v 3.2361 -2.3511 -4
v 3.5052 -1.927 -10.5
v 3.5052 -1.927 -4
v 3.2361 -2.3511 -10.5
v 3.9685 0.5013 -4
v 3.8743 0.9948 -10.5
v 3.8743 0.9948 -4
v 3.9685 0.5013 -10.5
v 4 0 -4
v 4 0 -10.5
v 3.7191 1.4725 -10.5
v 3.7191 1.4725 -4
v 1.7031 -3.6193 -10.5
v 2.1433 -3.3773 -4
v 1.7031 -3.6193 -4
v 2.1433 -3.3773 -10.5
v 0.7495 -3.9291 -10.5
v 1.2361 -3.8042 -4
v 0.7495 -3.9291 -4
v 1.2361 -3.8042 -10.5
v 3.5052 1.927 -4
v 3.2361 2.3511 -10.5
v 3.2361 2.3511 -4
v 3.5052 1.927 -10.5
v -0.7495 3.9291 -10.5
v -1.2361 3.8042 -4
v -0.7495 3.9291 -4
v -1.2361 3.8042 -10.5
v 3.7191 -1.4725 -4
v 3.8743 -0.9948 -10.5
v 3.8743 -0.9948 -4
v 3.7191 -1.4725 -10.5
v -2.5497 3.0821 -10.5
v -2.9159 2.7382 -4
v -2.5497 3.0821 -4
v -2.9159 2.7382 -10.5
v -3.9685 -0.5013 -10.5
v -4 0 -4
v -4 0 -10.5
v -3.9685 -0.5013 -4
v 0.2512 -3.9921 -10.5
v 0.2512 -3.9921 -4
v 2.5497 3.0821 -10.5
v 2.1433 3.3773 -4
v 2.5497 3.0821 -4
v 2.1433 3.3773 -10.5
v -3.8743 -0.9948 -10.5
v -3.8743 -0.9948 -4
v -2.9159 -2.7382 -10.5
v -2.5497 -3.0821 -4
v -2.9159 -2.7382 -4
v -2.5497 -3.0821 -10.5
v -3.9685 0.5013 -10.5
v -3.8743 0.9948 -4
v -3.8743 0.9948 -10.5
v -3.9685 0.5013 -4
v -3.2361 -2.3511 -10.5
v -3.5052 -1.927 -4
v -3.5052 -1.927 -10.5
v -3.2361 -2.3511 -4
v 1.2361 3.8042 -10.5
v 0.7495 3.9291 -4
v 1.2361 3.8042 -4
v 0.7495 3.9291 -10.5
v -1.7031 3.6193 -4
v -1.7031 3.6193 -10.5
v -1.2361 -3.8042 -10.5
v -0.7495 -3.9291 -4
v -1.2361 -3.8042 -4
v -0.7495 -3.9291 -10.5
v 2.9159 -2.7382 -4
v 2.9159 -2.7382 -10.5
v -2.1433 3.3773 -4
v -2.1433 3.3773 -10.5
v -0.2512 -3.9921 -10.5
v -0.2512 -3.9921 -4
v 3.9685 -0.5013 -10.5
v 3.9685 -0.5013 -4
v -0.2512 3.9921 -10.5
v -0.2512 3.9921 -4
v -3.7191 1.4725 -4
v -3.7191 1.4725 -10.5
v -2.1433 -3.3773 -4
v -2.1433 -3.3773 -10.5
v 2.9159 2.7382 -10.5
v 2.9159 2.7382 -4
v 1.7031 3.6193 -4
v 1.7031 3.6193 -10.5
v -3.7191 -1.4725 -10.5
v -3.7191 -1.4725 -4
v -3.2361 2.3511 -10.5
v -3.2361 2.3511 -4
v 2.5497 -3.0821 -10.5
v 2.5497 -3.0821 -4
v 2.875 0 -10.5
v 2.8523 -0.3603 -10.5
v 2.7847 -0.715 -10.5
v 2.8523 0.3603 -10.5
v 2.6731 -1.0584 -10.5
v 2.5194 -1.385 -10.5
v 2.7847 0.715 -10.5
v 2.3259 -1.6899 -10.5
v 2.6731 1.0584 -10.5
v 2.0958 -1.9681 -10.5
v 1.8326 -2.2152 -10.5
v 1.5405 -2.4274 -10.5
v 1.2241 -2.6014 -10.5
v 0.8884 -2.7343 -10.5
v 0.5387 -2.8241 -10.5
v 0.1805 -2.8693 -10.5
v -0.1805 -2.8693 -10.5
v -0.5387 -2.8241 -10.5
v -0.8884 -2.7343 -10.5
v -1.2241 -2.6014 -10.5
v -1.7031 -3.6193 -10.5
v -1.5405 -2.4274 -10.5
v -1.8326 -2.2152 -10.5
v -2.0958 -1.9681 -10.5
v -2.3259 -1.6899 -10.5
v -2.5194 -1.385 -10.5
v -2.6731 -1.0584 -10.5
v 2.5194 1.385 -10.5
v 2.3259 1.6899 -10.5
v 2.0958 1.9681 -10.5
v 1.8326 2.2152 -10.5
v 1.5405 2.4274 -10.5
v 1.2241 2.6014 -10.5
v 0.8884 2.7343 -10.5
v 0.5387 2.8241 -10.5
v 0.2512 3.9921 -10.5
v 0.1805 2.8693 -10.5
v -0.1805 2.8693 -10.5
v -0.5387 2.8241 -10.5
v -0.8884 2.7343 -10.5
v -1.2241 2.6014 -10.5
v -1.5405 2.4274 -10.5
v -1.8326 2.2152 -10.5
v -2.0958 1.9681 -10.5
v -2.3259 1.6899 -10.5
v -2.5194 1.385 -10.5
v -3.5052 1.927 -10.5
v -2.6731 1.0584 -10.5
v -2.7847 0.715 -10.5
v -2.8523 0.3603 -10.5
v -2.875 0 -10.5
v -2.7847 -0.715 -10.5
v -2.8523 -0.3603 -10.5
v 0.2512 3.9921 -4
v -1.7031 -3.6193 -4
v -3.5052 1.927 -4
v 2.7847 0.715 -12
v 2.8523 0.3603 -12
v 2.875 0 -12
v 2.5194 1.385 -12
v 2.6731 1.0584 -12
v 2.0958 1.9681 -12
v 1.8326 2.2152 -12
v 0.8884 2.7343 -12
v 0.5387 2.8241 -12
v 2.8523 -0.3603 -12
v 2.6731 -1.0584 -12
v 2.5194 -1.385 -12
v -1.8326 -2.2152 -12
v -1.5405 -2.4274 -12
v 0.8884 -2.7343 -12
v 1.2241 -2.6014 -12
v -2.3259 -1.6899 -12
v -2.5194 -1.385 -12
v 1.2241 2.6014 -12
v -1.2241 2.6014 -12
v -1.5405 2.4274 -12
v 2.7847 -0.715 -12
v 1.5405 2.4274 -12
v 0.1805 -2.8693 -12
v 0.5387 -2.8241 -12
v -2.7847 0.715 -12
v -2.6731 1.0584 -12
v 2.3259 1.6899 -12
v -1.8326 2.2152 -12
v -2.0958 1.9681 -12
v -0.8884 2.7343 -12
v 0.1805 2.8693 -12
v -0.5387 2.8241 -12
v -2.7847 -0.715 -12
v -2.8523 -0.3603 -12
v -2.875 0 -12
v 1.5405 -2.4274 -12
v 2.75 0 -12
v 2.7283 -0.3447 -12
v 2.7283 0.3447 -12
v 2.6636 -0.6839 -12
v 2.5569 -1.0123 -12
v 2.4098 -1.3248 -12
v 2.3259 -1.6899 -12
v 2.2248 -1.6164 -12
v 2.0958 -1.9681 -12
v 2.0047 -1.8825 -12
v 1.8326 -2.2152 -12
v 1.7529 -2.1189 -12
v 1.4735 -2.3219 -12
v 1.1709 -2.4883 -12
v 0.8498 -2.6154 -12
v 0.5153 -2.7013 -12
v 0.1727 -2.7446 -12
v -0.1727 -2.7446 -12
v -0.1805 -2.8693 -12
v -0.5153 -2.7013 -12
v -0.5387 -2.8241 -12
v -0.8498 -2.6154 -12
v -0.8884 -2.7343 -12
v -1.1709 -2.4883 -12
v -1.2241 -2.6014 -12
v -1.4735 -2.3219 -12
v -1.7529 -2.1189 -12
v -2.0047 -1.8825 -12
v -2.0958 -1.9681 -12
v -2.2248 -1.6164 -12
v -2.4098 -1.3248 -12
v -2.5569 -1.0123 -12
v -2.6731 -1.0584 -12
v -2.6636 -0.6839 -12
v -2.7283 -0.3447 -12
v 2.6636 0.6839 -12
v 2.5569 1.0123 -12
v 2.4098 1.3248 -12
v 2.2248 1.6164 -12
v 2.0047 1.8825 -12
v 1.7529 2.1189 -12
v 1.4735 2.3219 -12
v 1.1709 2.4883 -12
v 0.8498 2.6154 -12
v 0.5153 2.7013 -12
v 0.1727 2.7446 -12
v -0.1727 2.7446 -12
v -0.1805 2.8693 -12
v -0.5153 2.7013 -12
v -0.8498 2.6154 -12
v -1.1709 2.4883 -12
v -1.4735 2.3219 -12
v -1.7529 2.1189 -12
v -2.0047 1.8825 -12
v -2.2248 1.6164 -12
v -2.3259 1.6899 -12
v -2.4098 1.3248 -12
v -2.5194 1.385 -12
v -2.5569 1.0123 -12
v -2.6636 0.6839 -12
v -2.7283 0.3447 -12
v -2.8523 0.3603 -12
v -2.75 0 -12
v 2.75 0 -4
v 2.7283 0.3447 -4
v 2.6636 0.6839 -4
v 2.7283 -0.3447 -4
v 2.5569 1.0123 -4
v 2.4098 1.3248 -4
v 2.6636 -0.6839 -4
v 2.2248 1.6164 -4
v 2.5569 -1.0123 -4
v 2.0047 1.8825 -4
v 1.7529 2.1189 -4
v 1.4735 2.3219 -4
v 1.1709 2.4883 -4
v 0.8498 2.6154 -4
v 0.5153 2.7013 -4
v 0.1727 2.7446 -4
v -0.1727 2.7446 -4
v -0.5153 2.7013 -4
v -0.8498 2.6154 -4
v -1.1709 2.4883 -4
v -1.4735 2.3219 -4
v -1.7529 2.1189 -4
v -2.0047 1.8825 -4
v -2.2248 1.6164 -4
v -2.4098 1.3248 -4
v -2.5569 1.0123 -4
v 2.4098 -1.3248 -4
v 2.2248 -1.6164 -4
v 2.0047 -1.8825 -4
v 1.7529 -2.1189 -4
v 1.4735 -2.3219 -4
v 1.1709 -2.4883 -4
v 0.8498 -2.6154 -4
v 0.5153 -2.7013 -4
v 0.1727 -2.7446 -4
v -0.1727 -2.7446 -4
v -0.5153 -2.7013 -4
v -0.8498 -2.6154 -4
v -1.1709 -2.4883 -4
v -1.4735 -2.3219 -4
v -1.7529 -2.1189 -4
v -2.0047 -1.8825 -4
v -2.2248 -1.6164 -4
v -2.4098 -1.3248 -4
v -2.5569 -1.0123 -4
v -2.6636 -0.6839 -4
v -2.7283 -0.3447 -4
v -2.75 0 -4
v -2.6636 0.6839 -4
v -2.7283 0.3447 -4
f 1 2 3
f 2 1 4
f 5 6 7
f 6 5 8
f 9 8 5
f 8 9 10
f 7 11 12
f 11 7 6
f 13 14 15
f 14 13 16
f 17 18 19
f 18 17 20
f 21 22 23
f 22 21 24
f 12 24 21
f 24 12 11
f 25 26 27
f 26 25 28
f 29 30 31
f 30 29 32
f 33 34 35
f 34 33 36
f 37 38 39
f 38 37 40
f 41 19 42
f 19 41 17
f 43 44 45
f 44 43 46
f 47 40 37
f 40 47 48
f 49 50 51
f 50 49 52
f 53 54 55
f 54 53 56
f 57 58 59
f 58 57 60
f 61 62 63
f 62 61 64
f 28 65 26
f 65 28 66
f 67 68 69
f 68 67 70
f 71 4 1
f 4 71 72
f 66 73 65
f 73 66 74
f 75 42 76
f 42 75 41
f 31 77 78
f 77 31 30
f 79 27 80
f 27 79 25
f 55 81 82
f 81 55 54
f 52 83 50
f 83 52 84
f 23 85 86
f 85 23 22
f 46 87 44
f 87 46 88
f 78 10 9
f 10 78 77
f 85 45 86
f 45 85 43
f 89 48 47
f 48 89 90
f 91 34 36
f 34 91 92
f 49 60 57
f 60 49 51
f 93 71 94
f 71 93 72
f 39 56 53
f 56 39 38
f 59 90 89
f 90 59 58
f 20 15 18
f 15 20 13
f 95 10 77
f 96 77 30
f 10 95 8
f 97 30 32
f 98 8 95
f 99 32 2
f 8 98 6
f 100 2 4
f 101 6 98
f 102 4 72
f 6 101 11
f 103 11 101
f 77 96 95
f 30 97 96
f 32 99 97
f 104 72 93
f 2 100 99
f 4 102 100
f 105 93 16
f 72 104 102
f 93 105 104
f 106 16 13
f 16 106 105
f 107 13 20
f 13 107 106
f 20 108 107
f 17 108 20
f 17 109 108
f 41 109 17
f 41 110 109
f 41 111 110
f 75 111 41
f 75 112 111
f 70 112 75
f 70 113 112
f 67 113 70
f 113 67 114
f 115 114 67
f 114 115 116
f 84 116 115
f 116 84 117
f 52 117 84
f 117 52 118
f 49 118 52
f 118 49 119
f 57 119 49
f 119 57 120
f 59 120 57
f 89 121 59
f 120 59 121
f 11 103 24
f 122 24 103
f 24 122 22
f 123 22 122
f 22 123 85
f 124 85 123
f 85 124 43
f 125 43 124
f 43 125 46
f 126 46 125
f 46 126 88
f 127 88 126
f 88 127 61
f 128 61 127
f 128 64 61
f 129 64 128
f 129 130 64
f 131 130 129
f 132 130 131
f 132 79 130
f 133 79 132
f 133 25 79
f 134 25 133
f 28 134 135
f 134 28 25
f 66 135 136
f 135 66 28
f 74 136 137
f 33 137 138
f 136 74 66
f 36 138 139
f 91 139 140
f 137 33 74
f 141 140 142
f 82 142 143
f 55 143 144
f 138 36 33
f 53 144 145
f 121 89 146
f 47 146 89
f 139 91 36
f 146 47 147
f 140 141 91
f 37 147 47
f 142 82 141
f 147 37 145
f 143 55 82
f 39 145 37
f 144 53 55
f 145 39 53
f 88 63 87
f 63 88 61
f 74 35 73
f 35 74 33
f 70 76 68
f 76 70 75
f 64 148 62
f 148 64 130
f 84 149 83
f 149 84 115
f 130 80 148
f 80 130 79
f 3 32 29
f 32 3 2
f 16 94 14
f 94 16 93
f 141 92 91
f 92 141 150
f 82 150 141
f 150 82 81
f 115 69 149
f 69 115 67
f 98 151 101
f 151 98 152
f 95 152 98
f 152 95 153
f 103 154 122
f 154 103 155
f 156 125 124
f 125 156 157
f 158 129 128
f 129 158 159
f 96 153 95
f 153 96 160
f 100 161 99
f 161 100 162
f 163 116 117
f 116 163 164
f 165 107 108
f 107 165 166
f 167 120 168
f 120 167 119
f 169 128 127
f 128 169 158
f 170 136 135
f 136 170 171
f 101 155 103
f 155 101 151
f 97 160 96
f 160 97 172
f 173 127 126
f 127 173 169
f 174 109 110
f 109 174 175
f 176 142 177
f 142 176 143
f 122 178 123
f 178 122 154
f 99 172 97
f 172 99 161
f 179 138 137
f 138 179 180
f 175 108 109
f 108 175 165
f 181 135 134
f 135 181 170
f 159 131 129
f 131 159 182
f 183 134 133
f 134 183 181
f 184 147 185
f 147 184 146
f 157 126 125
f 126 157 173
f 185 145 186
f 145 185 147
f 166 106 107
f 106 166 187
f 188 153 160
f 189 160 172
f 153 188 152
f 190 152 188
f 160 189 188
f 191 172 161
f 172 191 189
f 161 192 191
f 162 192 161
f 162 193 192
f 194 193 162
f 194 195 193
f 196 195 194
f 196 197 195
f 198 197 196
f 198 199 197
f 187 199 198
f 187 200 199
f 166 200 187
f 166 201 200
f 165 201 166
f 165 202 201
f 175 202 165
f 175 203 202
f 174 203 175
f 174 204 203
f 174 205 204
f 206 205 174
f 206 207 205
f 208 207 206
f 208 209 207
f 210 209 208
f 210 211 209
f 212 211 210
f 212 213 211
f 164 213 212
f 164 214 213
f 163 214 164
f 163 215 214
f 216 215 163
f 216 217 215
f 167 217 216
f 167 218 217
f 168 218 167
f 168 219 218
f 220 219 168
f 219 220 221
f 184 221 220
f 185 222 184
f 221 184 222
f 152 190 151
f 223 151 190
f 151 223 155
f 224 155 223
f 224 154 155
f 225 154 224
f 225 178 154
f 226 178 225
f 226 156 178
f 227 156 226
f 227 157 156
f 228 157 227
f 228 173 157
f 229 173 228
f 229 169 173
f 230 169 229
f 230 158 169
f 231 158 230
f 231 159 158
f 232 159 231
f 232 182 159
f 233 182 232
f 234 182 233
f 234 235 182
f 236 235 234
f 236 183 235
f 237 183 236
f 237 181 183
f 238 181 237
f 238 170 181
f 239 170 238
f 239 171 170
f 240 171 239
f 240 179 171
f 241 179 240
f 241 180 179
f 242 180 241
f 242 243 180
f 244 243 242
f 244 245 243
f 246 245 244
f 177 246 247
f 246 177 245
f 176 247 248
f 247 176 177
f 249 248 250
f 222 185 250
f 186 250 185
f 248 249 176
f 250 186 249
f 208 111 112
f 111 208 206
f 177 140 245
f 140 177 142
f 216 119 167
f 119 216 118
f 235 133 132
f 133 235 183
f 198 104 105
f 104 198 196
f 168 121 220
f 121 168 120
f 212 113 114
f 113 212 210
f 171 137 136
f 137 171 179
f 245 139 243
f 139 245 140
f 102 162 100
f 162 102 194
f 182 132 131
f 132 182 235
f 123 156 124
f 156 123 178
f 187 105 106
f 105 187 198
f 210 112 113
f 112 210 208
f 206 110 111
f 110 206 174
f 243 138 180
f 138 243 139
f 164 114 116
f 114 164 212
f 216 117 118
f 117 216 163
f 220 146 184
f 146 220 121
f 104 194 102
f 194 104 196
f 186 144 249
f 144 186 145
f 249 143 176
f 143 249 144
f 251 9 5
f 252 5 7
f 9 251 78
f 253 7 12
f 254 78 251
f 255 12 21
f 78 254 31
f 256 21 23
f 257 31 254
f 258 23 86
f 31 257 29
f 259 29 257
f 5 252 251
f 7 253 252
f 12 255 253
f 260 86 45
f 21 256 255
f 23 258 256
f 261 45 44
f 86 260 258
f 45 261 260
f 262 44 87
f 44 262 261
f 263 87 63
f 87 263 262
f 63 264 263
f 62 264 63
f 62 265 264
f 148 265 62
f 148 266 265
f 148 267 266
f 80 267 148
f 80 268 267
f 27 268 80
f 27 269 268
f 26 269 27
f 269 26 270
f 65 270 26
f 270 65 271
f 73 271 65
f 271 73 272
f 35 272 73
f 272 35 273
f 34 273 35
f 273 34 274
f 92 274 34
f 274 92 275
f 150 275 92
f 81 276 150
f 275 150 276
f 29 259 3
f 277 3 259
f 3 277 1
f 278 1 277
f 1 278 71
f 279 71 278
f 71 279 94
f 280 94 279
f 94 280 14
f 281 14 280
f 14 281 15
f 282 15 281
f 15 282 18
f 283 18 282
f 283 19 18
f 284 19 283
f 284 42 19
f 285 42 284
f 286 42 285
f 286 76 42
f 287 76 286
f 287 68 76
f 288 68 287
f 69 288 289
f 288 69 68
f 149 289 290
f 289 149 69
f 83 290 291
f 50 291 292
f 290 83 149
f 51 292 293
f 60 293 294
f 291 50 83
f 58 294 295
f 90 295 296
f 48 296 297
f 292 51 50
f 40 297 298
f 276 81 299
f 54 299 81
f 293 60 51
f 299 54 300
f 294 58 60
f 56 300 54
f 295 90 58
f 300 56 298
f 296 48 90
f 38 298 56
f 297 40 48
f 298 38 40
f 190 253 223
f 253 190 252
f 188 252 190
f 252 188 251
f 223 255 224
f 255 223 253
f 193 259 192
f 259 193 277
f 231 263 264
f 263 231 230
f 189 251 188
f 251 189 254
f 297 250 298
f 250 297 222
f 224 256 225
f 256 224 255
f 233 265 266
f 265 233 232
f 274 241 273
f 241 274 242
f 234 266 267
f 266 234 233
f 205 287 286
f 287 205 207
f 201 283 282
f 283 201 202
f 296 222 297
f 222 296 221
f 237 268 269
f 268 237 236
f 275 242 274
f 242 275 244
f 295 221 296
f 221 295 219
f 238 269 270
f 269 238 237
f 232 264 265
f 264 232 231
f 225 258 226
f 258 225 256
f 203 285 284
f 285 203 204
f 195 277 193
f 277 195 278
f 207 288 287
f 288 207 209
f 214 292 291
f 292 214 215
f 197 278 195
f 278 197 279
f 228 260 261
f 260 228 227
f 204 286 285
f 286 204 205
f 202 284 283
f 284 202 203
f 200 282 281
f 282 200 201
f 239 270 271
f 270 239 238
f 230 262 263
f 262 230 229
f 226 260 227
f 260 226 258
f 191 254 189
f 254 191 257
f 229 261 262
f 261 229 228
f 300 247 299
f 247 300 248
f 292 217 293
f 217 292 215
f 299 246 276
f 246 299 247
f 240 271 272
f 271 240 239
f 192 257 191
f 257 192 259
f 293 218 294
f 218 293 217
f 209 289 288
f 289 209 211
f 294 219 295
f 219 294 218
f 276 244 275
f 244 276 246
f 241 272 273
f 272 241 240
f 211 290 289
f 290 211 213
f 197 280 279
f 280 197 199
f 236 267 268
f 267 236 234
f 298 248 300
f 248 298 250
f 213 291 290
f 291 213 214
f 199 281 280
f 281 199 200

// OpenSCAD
$fn = 50;

difference() {
	union() {
		translate(v = [0, 0, -10.5]) {
			cylinder(h = 13.5, r = 4.0);
		}
		#translate(v = [0, 0, -12.0]) {
			cylinder(h = 12, r = 2.875);
		}
	}
	union() {
		translate(v = [0, 0, 0]) {
			rotate(a = [0, 0, 0]) {
				difference() {
					union() {
						translate(v = [0, 0, -4]) {
							linear_extrude(height = 4) {
								polygon(points = [[4.8468, 0.0], [2.4234000000000004, 4.197451927062417], [-2.423399999999999, 4.197451927062417], [-4.8468, 5.935618106107392e-16], [-2.423400000000002, -4.197451927062416], [2.423399999999997, -4.197451927062419]]);
							}
						}
					}
					union();
				}
			}
		}
		#cylinder(h = 3, r = 6.25);
		#translate(v = [0, 0, -100.0]) {
			cylinder(h = 200, r = 2.75);
		}
	}
}
